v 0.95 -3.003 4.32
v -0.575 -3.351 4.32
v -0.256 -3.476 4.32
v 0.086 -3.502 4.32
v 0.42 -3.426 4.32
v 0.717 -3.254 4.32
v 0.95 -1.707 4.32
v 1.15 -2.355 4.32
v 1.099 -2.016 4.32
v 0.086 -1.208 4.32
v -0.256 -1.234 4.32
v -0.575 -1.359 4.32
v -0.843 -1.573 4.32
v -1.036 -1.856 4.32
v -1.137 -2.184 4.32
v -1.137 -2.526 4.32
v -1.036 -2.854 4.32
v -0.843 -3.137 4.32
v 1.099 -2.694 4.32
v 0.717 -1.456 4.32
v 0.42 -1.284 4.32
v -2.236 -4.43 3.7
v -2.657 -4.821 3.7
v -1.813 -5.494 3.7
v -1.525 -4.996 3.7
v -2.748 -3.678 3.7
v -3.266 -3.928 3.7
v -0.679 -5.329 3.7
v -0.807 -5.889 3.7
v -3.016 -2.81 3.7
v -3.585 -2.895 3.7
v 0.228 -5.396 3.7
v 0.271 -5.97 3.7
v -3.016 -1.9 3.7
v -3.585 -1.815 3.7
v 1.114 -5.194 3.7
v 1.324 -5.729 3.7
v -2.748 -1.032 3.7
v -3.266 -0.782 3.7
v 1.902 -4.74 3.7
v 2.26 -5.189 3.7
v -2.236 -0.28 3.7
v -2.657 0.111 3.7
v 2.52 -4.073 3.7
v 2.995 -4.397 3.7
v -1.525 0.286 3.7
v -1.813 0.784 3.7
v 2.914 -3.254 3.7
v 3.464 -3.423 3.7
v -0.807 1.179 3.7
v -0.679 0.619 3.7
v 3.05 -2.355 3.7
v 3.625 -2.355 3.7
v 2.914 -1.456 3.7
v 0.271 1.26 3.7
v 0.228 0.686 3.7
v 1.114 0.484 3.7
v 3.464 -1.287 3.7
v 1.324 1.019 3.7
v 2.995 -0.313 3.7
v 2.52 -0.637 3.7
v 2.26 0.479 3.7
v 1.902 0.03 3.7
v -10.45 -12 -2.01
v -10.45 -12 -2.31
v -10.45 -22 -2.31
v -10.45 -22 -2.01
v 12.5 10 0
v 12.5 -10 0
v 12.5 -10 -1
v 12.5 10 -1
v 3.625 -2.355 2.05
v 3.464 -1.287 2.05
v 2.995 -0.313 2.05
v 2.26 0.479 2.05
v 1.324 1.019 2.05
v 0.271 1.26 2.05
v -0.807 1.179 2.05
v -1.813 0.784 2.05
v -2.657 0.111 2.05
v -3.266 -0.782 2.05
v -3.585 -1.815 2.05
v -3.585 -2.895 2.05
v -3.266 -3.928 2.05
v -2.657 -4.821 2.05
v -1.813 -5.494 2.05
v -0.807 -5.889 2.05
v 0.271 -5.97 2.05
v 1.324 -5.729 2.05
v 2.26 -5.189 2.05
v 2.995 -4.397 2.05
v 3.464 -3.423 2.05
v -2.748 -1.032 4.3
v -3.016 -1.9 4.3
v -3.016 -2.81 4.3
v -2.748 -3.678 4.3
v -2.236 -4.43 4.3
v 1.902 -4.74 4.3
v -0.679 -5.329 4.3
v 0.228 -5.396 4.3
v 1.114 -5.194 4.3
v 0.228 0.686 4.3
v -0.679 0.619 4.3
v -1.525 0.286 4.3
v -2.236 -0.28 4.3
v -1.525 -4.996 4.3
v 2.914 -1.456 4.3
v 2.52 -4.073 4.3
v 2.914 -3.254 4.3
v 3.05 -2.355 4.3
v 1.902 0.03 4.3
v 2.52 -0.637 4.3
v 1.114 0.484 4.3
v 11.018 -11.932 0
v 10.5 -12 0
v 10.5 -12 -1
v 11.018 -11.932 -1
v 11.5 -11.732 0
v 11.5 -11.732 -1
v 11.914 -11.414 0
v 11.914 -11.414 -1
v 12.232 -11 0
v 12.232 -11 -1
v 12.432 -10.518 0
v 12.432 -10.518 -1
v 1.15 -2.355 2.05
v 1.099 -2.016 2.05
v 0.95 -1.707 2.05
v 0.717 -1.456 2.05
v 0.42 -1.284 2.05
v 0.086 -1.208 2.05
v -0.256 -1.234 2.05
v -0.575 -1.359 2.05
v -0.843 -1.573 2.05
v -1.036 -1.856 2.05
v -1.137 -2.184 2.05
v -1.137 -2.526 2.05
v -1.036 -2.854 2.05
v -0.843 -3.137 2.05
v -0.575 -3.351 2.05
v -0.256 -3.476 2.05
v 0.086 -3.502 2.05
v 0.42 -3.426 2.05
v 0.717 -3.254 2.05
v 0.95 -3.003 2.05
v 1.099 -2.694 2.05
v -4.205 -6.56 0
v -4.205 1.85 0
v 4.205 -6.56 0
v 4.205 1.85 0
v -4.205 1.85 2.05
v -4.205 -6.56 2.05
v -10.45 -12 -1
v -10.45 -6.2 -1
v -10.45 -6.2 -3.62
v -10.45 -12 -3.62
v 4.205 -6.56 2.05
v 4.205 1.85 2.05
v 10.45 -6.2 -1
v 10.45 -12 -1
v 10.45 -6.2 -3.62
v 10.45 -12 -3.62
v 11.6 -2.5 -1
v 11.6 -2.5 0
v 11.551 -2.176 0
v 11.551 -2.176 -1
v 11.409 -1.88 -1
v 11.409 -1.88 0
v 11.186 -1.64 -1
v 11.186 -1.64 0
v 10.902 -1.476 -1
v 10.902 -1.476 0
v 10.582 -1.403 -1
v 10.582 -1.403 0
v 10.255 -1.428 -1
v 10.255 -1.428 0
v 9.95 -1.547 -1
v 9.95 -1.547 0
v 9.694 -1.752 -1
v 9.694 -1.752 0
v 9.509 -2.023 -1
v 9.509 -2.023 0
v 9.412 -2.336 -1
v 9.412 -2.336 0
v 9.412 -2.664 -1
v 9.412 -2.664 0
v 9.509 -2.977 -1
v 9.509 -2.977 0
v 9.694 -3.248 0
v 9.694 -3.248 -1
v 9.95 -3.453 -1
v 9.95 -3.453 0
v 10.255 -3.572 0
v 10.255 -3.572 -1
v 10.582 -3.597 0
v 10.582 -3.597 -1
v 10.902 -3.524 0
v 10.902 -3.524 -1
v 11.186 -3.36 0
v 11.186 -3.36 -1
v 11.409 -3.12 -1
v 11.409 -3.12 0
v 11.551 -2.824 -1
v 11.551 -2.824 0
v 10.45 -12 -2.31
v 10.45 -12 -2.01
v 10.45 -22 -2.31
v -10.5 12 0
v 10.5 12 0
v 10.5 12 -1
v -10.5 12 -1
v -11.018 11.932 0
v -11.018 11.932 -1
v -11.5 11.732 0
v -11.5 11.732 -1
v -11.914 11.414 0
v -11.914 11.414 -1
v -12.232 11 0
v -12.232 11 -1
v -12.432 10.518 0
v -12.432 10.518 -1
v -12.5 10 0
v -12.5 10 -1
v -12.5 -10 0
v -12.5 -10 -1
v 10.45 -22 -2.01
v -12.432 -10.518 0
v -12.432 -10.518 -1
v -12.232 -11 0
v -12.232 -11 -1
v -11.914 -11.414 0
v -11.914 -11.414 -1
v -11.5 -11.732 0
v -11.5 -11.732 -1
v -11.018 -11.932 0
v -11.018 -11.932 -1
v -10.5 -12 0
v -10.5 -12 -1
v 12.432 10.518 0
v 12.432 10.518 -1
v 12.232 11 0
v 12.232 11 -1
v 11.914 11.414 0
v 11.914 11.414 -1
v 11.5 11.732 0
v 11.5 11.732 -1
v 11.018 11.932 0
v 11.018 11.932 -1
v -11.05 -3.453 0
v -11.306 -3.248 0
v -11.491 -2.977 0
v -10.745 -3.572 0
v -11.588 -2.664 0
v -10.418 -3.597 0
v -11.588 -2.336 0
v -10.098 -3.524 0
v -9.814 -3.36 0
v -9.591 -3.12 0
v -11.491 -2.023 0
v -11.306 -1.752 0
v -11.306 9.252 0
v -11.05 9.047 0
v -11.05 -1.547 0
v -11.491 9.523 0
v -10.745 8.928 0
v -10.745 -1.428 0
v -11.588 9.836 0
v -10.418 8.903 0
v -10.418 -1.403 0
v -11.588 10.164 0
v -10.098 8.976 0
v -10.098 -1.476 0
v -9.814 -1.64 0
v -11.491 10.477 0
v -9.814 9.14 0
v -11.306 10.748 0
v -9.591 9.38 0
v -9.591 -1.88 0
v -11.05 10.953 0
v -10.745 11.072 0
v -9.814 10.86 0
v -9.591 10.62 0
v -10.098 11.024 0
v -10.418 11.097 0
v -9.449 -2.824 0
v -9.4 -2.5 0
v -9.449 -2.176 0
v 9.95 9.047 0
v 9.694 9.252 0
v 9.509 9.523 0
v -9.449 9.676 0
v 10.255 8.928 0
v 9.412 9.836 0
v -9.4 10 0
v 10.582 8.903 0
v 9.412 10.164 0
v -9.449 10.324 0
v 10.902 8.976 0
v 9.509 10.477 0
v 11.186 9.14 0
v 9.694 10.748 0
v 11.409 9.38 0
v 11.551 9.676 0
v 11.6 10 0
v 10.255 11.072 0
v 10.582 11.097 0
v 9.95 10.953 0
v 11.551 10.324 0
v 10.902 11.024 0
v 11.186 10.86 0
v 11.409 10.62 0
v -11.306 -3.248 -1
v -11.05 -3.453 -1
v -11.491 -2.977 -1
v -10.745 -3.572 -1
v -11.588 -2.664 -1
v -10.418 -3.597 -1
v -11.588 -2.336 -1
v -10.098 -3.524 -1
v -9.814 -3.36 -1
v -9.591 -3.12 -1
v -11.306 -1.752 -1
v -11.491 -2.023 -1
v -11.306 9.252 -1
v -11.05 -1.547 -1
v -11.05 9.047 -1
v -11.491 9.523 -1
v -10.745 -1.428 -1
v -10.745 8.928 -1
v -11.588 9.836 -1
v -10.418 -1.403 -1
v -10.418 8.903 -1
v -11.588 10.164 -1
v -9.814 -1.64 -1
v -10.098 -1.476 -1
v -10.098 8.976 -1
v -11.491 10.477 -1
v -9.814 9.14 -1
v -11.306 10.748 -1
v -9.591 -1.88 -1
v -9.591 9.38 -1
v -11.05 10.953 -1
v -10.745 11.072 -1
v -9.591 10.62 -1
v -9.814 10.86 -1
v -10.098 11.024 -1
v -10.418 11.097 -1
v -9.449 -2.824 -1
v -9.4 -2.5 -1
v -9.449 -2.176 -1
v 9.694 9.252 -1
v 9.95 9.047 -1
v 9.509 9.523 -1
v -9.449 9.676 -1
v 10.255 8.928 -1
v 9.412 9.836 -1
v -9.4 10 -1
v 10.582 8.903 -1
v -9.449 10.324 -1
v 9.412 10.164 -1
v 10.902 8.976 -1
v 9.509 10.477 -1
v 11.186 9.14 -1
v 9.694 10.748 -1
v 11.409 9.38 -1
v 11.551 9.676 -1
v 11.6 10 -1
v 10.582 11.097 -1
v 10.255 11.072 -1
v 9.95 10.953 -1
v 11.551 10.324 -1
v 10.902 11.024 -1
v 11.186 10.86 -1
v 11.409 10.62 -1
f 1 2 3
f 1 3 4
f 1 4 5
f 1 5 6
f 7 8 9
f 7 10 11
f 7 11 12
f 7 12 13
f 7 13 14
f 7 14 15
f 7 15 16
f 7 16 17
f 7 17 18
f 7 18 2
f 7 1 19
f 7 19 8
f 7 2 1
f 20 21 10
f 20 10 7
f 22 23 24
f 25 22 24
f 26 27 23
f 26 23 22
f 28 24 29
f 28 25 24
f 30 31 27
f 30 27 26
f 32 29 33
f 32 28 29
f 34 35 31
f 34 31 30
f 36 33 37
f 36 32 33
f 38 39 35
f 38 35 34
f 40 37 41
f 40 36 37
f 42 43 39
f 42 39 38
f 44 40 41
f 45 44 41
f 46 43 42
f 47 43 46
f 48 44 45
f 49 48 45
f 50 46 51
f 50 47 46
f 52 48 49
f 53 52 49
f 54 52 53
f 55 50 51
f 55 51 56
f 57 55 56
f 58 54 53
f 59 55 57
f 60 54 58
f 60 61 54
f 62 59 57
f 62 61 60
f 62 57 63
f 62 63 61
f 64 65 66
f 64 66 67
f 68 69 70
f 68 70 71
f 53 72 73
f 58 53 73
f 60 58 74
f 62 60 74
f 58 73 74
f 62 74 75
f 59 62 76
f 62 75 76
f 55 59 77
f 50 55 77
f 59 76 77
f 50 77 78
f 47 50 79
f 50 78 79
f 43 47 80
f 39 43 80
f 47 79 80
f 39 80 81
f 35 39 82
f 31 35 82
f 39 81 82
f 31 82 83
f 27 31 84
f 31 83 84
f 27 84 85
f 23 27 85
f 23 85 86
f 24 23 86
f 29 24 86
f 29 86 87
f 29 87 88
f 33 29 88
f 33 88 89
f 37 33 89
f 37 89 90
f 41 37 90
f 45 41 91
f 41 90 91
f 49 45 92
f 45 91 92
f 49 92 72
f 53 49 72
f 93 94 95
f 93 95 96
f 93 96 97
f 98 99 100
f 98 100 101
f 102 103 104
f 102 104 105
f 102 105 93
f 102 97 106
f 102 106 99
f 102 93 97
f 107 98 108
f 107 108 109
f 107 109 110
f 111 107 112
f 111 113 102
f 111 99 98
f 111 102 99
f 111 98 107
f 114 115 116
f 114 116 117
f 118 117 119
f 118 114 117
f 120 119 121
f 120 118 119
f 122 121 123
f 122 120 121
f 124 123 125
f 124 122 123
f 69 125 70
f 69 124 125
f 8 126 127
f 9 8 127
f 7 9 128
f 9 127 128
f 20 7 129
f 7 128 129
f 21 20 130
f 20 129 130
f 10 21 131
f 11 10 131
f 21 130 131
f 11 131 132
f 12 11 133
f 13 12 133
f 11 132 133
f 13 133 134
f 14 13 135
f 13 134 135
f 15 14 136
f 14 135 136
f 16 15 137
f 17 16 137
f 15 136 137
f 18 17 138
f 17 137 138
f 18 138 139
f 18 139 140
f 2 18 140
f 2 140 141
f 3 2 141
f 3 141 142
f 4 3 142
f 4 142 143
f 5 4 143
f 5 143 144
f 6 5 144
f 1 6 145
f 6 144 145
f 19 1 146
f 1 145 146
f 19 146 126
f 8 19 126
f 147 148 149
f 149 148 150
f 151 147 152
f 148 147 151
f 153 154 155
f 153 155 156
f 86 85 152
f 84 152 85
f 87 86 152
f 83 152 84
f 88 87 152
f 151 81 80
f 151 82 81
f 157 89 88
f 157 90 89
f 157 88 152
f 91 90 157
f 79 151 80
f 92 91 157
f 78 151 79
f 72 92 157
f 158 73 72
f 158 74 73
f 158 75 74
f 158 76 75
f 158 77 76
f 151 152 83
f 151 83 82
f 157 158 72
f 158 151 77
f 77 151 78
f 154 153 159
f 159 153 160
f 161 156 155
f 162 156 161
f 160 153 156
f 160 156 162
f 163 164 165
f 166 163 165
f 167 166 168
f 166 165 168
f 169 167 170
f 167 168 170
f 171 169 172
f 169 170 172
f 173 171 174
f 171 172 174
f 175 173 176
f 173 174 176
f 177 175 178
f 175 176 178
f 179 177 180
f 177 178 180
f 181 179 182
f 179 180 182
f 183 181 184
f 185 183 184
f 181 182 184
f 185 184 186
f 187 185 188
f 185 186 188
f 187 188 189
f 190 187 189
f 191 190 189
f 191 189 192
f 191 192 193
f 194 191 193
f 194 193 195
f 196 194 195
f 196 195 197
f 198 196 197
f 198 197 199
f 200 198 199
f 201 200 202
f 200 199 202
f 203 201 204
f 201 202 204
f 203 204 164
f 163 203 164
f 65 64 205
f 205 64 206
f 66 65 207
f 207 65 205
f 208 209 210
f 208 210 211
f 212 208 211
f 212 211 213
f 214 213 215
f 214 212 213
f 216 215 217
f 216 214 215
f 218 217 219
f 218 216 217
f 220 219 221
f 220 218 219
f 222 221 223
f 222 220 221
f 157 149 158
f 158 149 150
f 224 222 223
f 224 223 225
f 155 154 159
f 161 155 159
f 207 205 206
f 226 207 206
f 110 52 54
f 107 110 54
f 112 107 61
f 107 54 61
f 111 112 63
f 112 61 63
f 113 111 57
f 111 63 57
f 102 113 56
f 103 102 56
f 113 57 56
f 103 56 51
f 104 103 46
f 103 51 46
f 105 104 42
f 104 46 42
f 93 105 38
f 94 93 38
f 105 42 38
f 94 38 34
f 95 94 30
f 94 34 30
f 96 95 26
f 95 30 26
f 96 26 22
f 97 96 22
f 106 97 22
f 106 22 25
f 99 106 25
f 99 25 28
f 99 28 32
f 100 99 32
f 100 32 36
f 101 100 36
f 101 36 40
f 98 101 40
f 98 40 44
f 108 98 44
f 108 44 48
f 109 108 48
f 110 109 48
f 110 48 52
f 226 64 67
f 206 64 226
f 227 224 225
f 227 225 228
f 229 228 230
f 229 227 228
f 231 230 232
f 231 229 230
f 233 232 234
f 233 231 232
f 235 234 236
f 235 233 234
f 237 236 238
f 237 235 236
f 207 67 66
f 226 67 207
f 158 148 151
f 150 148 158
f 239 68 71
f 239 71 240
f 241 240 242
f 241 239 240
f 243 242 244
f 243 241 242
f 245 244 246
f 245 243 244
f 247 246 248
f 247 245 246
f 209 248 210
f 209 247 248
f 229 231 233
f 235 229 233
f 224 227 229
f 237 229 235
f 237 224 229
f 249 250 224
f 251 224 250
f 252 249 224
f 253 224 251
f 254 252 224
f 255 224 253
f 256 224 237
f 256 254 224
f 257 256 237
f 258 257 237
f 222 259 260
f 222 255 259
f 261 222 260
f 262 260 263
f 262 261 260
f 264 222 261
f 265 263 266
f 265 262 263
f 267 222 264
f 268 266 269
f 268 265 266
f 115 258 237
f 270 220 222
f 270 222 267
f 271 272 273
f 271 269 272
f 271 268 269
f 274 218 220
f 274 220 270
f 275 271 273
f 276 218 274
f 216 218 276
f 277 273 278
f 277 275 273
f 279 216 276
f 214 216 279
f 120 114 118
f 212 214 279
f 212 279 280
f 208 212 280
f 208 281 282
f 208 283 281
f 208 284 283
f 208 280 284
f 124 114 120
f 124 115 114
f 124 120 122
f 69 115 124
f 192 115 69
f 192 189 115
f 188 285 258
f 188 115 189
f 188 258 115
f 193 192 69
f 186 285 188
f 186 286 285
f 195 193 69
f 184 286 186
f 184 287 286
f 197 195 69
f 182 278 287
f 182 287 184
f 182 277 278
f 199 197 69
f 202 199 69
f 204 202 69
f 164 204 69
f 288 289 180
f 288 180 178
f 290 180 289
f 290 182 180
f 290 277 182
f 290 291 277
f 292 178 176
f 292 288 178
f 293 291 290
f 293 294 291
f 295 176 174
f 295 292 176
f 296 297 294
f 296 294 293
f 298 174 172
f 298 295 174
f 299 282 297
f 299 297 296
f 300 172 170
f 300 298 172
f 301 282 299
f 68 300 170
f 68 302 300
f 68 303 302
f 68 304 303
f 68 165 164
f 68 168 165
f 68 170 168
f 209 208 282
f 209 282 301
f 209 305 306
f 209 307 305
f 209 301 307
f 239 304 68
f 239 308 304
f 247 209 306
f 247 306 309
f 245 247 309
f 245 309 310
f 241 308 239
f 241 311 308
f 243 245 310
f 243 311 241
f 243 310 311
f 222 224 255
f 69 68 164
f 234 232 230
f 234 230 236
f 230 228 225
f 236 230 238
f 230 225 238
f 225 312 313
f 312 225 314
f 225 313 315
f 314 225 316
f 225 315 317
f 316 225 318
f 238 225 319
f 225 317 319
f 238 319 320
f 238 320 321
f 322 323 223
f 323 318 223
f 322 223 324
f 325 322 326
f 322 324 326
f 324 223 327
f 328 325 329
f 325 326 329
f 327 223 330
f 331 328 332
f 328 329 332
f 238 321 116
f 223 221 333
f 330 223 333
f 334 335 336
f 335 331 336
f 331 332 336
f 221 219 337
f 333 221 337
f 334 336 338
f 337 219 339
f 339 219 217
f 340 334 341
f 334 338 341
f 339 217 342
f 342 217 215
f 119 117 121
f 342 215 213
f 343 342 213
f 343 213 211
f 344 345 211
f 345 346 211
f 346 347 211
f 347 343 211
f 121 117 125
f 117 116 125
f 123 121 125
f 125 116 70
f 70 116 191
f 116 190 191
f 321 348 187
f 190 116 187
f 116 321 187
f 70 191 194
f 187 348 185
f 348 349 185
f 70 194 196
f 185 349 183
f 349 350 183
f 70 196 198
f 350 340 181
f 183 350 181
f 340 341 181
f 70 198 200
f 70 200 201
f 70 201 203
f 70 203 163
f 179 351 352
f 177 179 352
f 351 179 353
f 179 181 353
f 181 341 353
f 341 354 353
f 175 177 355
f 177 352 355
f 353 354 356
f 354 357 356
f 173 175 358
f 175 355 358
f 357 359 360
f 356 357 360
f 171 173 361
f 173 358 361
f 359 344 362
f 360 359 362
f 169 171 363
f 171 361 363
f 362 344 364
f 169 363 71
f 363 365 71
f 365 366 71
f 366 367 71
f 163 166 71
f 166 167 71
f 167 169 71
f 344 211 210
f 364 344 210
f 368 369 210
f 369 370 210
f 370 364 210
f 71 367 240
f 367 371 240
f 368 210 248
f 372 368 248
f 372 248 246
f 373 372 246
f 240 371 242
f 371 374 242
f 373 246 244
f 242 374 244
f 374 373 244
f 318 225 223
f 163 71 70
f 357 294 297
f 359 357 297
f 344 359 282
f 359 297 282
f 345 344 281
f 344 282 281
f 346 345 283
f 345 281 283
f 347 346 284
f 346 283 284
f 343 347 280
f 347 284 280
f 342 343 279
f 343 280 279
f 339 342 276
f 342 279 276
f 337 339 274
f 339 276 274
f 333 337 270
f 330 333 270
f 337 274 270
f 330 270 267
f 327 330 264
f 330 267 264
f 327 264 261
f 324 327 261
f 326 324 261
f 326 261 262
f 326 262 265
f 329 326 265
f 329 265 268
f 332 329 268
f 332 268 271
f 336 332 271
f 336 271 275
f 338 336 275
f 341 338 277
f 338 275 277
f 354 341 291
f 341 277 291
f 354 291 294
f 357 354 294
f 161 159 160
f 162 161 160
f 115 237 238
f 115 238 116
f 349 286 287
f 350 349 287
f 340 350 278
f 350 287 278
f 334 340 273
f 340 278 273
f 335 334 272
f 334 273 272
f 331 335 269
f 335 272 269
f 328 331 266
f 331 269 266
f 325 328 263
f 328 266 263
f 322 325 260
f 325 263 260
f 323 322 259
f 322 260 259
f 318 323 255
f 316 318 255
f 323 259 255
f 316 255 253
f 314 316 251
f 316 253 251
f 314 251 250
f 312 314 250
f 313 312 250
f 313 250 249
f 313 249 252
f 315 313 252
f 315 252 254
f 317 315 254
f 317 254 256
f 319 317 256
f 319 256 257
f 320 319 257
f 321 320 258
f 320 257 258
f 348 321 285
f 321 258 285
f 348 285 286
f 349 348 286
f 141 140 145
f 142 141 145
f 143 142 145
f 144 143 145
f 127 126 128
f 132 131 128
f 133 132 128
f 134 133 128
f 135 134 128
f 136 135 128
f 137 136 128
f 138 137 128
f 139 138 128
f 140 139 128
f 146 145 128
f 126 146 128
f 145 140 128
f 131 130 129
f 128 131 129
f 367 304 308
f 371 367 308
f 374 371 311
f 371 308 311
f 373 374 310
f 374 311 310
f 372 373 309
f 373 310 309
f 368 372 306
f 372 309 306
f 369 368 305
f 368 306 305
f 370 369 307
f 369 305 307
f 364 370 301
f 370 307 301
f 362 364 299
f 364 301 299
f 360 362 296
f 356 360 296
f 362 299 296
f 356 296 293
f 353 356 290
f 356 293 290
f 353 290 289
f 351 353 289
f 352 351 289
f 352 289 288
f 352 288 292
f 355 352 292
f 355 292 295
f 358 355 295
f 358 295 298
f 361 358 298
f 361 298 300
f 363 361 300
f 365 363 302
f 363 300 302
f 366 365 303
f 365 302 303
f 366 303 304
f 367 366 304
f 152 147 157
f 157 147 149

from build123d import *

# Parameters (mm, degrees)
F1_DEPTH  = 1
F2_R      = 1.1
F3_DEPTH  = 1
F4_W      = 8.41
F4_H      = 8.41
F5_DEPTH  = 2.05
F6_R      = 3.625
F6_R_2    = 3.05
F6_R_3    = 1.15
F7_DEPTH  = 1.65
F8_DEPTH  = 2.25
F9_DEPTH  = 2.27
F10_W     = 20.9
F10_H     = 5.8
F11_DEPTH = 2.62
F12_W     = 20.9
F12_H     = 0.3
F13_DEPTH = 10


with BuildPart() as f1:
    # F0 (on Top) → F1 (new body)
    with BuildSketch(Plane.XY):
        with BuildLine():
            ThreePointArc((12.5, 10), (11.914214, 11.414214), (10.5, 12))
            Line((10.5, 12), (-10.5, 12))
            ThreePointArc((-10.5, 12), (-11.914214, 11.414214), (-12.5, 10))
            Line((-12.5, 10), (-12.5, -10))
            ThreePointArc((-12.5, -10), (-11.914214, -11.414214), (-10.5, -12))
            Line((-10.5, -12), (10.5, -12))
            ThreePointArc((10.5, -12), (11.914214, -11.414214), (12.5, -10))
            Line((12.5, -10), (12.5, 10))
        make_face()
    extrude(amount=-F1_DEPTH)

    # F2 (on face) → F3 (cut, through all)
    with BuildSketch(Plane.XY):
        with Locations((-10.5, 10)):
            Circle(F2_R)
        with Locations((-10.5, -2.5)):
            Circle(F2_R)
        with Locations((10.5, -2.5)):
            Circle(F2_R)
        with Locations((10.5, 10)):
            Circle(F2_R)
    extrude(amount=-F3_DEPTH, mode=Mode.SUBTRACT)


with BuildPart() as f5:
    # F4 (on face) → F5 (new body)
    with BuildSketch(Plane.XY):
        with Locations((0, -2.355)):
            Rectangle(F4_W, F4_H)
    extrude(amount=F5_DEPTH)

    # F6 (on face) → F7 (join)
    with BuildSketch(Plane.XY.offset(2.05)):
        with Locations((0, -2.355)):
            Circle(F6_R)
        with Locations((0, -2.355)):
            Circle(F6_R_2, mode=Mode.SUBTRACT)
        with Locations((0, -2.355)):
            Circle(F6_R_2)
        with Locations((0, -2.355)):
            Circle(F6_R_3, mode=Mode.SUBTRACT)
        with Locations((0, -2.355)):
            Circle(F6_R_3)
    extrude(amount=F7_DEPTH)

    # F6 (on face) → F8 (join)
    with BuildSketch(Plane.XY.offset(2.05)):
        with Locations((0, -2.355)):
            Circle(F6_R_2)
        with Locations((0, -2.355)):
            Circle(F6_R_3, mode=Mode.SUBTRACT)
        with Locations((0, -2.355)):
            Circle(F6_R_3)
    extrude(amount=F8_DEPTH)


with BuildPart() as f9:
    # F6 (on face) → F9 (new body)
    with BuildSketch(Plane.XY.offset(2.05)):
        with Locations((0, -2.355)):
            Circle(F6_R_3)
    extrude(amount=F9_DEPTH)


with BuildPart() as f11:
    # F10 (on face) → F11 (new body)
    with BuildSketch(Plane(origin=(0, 0, -1), x_dir=(1, 0, 0), z_dir=(0, 0, -1))):
        with Locations((0, 9.1)):
            Rectangle(F10_W, F10_H)
    extrude(amount=F11_DEPTH)


with BuildPart() as f13:
    # F12 (on face) → F13 (new body)
    with BuildSketch(Plane.XZ.offset(12)):
        with Locations((0, -2.16)):
            Rectangle(F12_W, F12_H)
    extrude(amount=F13_DEPTH)


solid = Compound([f1.part, f5.part, f9.part, f11.part, f13.part])
